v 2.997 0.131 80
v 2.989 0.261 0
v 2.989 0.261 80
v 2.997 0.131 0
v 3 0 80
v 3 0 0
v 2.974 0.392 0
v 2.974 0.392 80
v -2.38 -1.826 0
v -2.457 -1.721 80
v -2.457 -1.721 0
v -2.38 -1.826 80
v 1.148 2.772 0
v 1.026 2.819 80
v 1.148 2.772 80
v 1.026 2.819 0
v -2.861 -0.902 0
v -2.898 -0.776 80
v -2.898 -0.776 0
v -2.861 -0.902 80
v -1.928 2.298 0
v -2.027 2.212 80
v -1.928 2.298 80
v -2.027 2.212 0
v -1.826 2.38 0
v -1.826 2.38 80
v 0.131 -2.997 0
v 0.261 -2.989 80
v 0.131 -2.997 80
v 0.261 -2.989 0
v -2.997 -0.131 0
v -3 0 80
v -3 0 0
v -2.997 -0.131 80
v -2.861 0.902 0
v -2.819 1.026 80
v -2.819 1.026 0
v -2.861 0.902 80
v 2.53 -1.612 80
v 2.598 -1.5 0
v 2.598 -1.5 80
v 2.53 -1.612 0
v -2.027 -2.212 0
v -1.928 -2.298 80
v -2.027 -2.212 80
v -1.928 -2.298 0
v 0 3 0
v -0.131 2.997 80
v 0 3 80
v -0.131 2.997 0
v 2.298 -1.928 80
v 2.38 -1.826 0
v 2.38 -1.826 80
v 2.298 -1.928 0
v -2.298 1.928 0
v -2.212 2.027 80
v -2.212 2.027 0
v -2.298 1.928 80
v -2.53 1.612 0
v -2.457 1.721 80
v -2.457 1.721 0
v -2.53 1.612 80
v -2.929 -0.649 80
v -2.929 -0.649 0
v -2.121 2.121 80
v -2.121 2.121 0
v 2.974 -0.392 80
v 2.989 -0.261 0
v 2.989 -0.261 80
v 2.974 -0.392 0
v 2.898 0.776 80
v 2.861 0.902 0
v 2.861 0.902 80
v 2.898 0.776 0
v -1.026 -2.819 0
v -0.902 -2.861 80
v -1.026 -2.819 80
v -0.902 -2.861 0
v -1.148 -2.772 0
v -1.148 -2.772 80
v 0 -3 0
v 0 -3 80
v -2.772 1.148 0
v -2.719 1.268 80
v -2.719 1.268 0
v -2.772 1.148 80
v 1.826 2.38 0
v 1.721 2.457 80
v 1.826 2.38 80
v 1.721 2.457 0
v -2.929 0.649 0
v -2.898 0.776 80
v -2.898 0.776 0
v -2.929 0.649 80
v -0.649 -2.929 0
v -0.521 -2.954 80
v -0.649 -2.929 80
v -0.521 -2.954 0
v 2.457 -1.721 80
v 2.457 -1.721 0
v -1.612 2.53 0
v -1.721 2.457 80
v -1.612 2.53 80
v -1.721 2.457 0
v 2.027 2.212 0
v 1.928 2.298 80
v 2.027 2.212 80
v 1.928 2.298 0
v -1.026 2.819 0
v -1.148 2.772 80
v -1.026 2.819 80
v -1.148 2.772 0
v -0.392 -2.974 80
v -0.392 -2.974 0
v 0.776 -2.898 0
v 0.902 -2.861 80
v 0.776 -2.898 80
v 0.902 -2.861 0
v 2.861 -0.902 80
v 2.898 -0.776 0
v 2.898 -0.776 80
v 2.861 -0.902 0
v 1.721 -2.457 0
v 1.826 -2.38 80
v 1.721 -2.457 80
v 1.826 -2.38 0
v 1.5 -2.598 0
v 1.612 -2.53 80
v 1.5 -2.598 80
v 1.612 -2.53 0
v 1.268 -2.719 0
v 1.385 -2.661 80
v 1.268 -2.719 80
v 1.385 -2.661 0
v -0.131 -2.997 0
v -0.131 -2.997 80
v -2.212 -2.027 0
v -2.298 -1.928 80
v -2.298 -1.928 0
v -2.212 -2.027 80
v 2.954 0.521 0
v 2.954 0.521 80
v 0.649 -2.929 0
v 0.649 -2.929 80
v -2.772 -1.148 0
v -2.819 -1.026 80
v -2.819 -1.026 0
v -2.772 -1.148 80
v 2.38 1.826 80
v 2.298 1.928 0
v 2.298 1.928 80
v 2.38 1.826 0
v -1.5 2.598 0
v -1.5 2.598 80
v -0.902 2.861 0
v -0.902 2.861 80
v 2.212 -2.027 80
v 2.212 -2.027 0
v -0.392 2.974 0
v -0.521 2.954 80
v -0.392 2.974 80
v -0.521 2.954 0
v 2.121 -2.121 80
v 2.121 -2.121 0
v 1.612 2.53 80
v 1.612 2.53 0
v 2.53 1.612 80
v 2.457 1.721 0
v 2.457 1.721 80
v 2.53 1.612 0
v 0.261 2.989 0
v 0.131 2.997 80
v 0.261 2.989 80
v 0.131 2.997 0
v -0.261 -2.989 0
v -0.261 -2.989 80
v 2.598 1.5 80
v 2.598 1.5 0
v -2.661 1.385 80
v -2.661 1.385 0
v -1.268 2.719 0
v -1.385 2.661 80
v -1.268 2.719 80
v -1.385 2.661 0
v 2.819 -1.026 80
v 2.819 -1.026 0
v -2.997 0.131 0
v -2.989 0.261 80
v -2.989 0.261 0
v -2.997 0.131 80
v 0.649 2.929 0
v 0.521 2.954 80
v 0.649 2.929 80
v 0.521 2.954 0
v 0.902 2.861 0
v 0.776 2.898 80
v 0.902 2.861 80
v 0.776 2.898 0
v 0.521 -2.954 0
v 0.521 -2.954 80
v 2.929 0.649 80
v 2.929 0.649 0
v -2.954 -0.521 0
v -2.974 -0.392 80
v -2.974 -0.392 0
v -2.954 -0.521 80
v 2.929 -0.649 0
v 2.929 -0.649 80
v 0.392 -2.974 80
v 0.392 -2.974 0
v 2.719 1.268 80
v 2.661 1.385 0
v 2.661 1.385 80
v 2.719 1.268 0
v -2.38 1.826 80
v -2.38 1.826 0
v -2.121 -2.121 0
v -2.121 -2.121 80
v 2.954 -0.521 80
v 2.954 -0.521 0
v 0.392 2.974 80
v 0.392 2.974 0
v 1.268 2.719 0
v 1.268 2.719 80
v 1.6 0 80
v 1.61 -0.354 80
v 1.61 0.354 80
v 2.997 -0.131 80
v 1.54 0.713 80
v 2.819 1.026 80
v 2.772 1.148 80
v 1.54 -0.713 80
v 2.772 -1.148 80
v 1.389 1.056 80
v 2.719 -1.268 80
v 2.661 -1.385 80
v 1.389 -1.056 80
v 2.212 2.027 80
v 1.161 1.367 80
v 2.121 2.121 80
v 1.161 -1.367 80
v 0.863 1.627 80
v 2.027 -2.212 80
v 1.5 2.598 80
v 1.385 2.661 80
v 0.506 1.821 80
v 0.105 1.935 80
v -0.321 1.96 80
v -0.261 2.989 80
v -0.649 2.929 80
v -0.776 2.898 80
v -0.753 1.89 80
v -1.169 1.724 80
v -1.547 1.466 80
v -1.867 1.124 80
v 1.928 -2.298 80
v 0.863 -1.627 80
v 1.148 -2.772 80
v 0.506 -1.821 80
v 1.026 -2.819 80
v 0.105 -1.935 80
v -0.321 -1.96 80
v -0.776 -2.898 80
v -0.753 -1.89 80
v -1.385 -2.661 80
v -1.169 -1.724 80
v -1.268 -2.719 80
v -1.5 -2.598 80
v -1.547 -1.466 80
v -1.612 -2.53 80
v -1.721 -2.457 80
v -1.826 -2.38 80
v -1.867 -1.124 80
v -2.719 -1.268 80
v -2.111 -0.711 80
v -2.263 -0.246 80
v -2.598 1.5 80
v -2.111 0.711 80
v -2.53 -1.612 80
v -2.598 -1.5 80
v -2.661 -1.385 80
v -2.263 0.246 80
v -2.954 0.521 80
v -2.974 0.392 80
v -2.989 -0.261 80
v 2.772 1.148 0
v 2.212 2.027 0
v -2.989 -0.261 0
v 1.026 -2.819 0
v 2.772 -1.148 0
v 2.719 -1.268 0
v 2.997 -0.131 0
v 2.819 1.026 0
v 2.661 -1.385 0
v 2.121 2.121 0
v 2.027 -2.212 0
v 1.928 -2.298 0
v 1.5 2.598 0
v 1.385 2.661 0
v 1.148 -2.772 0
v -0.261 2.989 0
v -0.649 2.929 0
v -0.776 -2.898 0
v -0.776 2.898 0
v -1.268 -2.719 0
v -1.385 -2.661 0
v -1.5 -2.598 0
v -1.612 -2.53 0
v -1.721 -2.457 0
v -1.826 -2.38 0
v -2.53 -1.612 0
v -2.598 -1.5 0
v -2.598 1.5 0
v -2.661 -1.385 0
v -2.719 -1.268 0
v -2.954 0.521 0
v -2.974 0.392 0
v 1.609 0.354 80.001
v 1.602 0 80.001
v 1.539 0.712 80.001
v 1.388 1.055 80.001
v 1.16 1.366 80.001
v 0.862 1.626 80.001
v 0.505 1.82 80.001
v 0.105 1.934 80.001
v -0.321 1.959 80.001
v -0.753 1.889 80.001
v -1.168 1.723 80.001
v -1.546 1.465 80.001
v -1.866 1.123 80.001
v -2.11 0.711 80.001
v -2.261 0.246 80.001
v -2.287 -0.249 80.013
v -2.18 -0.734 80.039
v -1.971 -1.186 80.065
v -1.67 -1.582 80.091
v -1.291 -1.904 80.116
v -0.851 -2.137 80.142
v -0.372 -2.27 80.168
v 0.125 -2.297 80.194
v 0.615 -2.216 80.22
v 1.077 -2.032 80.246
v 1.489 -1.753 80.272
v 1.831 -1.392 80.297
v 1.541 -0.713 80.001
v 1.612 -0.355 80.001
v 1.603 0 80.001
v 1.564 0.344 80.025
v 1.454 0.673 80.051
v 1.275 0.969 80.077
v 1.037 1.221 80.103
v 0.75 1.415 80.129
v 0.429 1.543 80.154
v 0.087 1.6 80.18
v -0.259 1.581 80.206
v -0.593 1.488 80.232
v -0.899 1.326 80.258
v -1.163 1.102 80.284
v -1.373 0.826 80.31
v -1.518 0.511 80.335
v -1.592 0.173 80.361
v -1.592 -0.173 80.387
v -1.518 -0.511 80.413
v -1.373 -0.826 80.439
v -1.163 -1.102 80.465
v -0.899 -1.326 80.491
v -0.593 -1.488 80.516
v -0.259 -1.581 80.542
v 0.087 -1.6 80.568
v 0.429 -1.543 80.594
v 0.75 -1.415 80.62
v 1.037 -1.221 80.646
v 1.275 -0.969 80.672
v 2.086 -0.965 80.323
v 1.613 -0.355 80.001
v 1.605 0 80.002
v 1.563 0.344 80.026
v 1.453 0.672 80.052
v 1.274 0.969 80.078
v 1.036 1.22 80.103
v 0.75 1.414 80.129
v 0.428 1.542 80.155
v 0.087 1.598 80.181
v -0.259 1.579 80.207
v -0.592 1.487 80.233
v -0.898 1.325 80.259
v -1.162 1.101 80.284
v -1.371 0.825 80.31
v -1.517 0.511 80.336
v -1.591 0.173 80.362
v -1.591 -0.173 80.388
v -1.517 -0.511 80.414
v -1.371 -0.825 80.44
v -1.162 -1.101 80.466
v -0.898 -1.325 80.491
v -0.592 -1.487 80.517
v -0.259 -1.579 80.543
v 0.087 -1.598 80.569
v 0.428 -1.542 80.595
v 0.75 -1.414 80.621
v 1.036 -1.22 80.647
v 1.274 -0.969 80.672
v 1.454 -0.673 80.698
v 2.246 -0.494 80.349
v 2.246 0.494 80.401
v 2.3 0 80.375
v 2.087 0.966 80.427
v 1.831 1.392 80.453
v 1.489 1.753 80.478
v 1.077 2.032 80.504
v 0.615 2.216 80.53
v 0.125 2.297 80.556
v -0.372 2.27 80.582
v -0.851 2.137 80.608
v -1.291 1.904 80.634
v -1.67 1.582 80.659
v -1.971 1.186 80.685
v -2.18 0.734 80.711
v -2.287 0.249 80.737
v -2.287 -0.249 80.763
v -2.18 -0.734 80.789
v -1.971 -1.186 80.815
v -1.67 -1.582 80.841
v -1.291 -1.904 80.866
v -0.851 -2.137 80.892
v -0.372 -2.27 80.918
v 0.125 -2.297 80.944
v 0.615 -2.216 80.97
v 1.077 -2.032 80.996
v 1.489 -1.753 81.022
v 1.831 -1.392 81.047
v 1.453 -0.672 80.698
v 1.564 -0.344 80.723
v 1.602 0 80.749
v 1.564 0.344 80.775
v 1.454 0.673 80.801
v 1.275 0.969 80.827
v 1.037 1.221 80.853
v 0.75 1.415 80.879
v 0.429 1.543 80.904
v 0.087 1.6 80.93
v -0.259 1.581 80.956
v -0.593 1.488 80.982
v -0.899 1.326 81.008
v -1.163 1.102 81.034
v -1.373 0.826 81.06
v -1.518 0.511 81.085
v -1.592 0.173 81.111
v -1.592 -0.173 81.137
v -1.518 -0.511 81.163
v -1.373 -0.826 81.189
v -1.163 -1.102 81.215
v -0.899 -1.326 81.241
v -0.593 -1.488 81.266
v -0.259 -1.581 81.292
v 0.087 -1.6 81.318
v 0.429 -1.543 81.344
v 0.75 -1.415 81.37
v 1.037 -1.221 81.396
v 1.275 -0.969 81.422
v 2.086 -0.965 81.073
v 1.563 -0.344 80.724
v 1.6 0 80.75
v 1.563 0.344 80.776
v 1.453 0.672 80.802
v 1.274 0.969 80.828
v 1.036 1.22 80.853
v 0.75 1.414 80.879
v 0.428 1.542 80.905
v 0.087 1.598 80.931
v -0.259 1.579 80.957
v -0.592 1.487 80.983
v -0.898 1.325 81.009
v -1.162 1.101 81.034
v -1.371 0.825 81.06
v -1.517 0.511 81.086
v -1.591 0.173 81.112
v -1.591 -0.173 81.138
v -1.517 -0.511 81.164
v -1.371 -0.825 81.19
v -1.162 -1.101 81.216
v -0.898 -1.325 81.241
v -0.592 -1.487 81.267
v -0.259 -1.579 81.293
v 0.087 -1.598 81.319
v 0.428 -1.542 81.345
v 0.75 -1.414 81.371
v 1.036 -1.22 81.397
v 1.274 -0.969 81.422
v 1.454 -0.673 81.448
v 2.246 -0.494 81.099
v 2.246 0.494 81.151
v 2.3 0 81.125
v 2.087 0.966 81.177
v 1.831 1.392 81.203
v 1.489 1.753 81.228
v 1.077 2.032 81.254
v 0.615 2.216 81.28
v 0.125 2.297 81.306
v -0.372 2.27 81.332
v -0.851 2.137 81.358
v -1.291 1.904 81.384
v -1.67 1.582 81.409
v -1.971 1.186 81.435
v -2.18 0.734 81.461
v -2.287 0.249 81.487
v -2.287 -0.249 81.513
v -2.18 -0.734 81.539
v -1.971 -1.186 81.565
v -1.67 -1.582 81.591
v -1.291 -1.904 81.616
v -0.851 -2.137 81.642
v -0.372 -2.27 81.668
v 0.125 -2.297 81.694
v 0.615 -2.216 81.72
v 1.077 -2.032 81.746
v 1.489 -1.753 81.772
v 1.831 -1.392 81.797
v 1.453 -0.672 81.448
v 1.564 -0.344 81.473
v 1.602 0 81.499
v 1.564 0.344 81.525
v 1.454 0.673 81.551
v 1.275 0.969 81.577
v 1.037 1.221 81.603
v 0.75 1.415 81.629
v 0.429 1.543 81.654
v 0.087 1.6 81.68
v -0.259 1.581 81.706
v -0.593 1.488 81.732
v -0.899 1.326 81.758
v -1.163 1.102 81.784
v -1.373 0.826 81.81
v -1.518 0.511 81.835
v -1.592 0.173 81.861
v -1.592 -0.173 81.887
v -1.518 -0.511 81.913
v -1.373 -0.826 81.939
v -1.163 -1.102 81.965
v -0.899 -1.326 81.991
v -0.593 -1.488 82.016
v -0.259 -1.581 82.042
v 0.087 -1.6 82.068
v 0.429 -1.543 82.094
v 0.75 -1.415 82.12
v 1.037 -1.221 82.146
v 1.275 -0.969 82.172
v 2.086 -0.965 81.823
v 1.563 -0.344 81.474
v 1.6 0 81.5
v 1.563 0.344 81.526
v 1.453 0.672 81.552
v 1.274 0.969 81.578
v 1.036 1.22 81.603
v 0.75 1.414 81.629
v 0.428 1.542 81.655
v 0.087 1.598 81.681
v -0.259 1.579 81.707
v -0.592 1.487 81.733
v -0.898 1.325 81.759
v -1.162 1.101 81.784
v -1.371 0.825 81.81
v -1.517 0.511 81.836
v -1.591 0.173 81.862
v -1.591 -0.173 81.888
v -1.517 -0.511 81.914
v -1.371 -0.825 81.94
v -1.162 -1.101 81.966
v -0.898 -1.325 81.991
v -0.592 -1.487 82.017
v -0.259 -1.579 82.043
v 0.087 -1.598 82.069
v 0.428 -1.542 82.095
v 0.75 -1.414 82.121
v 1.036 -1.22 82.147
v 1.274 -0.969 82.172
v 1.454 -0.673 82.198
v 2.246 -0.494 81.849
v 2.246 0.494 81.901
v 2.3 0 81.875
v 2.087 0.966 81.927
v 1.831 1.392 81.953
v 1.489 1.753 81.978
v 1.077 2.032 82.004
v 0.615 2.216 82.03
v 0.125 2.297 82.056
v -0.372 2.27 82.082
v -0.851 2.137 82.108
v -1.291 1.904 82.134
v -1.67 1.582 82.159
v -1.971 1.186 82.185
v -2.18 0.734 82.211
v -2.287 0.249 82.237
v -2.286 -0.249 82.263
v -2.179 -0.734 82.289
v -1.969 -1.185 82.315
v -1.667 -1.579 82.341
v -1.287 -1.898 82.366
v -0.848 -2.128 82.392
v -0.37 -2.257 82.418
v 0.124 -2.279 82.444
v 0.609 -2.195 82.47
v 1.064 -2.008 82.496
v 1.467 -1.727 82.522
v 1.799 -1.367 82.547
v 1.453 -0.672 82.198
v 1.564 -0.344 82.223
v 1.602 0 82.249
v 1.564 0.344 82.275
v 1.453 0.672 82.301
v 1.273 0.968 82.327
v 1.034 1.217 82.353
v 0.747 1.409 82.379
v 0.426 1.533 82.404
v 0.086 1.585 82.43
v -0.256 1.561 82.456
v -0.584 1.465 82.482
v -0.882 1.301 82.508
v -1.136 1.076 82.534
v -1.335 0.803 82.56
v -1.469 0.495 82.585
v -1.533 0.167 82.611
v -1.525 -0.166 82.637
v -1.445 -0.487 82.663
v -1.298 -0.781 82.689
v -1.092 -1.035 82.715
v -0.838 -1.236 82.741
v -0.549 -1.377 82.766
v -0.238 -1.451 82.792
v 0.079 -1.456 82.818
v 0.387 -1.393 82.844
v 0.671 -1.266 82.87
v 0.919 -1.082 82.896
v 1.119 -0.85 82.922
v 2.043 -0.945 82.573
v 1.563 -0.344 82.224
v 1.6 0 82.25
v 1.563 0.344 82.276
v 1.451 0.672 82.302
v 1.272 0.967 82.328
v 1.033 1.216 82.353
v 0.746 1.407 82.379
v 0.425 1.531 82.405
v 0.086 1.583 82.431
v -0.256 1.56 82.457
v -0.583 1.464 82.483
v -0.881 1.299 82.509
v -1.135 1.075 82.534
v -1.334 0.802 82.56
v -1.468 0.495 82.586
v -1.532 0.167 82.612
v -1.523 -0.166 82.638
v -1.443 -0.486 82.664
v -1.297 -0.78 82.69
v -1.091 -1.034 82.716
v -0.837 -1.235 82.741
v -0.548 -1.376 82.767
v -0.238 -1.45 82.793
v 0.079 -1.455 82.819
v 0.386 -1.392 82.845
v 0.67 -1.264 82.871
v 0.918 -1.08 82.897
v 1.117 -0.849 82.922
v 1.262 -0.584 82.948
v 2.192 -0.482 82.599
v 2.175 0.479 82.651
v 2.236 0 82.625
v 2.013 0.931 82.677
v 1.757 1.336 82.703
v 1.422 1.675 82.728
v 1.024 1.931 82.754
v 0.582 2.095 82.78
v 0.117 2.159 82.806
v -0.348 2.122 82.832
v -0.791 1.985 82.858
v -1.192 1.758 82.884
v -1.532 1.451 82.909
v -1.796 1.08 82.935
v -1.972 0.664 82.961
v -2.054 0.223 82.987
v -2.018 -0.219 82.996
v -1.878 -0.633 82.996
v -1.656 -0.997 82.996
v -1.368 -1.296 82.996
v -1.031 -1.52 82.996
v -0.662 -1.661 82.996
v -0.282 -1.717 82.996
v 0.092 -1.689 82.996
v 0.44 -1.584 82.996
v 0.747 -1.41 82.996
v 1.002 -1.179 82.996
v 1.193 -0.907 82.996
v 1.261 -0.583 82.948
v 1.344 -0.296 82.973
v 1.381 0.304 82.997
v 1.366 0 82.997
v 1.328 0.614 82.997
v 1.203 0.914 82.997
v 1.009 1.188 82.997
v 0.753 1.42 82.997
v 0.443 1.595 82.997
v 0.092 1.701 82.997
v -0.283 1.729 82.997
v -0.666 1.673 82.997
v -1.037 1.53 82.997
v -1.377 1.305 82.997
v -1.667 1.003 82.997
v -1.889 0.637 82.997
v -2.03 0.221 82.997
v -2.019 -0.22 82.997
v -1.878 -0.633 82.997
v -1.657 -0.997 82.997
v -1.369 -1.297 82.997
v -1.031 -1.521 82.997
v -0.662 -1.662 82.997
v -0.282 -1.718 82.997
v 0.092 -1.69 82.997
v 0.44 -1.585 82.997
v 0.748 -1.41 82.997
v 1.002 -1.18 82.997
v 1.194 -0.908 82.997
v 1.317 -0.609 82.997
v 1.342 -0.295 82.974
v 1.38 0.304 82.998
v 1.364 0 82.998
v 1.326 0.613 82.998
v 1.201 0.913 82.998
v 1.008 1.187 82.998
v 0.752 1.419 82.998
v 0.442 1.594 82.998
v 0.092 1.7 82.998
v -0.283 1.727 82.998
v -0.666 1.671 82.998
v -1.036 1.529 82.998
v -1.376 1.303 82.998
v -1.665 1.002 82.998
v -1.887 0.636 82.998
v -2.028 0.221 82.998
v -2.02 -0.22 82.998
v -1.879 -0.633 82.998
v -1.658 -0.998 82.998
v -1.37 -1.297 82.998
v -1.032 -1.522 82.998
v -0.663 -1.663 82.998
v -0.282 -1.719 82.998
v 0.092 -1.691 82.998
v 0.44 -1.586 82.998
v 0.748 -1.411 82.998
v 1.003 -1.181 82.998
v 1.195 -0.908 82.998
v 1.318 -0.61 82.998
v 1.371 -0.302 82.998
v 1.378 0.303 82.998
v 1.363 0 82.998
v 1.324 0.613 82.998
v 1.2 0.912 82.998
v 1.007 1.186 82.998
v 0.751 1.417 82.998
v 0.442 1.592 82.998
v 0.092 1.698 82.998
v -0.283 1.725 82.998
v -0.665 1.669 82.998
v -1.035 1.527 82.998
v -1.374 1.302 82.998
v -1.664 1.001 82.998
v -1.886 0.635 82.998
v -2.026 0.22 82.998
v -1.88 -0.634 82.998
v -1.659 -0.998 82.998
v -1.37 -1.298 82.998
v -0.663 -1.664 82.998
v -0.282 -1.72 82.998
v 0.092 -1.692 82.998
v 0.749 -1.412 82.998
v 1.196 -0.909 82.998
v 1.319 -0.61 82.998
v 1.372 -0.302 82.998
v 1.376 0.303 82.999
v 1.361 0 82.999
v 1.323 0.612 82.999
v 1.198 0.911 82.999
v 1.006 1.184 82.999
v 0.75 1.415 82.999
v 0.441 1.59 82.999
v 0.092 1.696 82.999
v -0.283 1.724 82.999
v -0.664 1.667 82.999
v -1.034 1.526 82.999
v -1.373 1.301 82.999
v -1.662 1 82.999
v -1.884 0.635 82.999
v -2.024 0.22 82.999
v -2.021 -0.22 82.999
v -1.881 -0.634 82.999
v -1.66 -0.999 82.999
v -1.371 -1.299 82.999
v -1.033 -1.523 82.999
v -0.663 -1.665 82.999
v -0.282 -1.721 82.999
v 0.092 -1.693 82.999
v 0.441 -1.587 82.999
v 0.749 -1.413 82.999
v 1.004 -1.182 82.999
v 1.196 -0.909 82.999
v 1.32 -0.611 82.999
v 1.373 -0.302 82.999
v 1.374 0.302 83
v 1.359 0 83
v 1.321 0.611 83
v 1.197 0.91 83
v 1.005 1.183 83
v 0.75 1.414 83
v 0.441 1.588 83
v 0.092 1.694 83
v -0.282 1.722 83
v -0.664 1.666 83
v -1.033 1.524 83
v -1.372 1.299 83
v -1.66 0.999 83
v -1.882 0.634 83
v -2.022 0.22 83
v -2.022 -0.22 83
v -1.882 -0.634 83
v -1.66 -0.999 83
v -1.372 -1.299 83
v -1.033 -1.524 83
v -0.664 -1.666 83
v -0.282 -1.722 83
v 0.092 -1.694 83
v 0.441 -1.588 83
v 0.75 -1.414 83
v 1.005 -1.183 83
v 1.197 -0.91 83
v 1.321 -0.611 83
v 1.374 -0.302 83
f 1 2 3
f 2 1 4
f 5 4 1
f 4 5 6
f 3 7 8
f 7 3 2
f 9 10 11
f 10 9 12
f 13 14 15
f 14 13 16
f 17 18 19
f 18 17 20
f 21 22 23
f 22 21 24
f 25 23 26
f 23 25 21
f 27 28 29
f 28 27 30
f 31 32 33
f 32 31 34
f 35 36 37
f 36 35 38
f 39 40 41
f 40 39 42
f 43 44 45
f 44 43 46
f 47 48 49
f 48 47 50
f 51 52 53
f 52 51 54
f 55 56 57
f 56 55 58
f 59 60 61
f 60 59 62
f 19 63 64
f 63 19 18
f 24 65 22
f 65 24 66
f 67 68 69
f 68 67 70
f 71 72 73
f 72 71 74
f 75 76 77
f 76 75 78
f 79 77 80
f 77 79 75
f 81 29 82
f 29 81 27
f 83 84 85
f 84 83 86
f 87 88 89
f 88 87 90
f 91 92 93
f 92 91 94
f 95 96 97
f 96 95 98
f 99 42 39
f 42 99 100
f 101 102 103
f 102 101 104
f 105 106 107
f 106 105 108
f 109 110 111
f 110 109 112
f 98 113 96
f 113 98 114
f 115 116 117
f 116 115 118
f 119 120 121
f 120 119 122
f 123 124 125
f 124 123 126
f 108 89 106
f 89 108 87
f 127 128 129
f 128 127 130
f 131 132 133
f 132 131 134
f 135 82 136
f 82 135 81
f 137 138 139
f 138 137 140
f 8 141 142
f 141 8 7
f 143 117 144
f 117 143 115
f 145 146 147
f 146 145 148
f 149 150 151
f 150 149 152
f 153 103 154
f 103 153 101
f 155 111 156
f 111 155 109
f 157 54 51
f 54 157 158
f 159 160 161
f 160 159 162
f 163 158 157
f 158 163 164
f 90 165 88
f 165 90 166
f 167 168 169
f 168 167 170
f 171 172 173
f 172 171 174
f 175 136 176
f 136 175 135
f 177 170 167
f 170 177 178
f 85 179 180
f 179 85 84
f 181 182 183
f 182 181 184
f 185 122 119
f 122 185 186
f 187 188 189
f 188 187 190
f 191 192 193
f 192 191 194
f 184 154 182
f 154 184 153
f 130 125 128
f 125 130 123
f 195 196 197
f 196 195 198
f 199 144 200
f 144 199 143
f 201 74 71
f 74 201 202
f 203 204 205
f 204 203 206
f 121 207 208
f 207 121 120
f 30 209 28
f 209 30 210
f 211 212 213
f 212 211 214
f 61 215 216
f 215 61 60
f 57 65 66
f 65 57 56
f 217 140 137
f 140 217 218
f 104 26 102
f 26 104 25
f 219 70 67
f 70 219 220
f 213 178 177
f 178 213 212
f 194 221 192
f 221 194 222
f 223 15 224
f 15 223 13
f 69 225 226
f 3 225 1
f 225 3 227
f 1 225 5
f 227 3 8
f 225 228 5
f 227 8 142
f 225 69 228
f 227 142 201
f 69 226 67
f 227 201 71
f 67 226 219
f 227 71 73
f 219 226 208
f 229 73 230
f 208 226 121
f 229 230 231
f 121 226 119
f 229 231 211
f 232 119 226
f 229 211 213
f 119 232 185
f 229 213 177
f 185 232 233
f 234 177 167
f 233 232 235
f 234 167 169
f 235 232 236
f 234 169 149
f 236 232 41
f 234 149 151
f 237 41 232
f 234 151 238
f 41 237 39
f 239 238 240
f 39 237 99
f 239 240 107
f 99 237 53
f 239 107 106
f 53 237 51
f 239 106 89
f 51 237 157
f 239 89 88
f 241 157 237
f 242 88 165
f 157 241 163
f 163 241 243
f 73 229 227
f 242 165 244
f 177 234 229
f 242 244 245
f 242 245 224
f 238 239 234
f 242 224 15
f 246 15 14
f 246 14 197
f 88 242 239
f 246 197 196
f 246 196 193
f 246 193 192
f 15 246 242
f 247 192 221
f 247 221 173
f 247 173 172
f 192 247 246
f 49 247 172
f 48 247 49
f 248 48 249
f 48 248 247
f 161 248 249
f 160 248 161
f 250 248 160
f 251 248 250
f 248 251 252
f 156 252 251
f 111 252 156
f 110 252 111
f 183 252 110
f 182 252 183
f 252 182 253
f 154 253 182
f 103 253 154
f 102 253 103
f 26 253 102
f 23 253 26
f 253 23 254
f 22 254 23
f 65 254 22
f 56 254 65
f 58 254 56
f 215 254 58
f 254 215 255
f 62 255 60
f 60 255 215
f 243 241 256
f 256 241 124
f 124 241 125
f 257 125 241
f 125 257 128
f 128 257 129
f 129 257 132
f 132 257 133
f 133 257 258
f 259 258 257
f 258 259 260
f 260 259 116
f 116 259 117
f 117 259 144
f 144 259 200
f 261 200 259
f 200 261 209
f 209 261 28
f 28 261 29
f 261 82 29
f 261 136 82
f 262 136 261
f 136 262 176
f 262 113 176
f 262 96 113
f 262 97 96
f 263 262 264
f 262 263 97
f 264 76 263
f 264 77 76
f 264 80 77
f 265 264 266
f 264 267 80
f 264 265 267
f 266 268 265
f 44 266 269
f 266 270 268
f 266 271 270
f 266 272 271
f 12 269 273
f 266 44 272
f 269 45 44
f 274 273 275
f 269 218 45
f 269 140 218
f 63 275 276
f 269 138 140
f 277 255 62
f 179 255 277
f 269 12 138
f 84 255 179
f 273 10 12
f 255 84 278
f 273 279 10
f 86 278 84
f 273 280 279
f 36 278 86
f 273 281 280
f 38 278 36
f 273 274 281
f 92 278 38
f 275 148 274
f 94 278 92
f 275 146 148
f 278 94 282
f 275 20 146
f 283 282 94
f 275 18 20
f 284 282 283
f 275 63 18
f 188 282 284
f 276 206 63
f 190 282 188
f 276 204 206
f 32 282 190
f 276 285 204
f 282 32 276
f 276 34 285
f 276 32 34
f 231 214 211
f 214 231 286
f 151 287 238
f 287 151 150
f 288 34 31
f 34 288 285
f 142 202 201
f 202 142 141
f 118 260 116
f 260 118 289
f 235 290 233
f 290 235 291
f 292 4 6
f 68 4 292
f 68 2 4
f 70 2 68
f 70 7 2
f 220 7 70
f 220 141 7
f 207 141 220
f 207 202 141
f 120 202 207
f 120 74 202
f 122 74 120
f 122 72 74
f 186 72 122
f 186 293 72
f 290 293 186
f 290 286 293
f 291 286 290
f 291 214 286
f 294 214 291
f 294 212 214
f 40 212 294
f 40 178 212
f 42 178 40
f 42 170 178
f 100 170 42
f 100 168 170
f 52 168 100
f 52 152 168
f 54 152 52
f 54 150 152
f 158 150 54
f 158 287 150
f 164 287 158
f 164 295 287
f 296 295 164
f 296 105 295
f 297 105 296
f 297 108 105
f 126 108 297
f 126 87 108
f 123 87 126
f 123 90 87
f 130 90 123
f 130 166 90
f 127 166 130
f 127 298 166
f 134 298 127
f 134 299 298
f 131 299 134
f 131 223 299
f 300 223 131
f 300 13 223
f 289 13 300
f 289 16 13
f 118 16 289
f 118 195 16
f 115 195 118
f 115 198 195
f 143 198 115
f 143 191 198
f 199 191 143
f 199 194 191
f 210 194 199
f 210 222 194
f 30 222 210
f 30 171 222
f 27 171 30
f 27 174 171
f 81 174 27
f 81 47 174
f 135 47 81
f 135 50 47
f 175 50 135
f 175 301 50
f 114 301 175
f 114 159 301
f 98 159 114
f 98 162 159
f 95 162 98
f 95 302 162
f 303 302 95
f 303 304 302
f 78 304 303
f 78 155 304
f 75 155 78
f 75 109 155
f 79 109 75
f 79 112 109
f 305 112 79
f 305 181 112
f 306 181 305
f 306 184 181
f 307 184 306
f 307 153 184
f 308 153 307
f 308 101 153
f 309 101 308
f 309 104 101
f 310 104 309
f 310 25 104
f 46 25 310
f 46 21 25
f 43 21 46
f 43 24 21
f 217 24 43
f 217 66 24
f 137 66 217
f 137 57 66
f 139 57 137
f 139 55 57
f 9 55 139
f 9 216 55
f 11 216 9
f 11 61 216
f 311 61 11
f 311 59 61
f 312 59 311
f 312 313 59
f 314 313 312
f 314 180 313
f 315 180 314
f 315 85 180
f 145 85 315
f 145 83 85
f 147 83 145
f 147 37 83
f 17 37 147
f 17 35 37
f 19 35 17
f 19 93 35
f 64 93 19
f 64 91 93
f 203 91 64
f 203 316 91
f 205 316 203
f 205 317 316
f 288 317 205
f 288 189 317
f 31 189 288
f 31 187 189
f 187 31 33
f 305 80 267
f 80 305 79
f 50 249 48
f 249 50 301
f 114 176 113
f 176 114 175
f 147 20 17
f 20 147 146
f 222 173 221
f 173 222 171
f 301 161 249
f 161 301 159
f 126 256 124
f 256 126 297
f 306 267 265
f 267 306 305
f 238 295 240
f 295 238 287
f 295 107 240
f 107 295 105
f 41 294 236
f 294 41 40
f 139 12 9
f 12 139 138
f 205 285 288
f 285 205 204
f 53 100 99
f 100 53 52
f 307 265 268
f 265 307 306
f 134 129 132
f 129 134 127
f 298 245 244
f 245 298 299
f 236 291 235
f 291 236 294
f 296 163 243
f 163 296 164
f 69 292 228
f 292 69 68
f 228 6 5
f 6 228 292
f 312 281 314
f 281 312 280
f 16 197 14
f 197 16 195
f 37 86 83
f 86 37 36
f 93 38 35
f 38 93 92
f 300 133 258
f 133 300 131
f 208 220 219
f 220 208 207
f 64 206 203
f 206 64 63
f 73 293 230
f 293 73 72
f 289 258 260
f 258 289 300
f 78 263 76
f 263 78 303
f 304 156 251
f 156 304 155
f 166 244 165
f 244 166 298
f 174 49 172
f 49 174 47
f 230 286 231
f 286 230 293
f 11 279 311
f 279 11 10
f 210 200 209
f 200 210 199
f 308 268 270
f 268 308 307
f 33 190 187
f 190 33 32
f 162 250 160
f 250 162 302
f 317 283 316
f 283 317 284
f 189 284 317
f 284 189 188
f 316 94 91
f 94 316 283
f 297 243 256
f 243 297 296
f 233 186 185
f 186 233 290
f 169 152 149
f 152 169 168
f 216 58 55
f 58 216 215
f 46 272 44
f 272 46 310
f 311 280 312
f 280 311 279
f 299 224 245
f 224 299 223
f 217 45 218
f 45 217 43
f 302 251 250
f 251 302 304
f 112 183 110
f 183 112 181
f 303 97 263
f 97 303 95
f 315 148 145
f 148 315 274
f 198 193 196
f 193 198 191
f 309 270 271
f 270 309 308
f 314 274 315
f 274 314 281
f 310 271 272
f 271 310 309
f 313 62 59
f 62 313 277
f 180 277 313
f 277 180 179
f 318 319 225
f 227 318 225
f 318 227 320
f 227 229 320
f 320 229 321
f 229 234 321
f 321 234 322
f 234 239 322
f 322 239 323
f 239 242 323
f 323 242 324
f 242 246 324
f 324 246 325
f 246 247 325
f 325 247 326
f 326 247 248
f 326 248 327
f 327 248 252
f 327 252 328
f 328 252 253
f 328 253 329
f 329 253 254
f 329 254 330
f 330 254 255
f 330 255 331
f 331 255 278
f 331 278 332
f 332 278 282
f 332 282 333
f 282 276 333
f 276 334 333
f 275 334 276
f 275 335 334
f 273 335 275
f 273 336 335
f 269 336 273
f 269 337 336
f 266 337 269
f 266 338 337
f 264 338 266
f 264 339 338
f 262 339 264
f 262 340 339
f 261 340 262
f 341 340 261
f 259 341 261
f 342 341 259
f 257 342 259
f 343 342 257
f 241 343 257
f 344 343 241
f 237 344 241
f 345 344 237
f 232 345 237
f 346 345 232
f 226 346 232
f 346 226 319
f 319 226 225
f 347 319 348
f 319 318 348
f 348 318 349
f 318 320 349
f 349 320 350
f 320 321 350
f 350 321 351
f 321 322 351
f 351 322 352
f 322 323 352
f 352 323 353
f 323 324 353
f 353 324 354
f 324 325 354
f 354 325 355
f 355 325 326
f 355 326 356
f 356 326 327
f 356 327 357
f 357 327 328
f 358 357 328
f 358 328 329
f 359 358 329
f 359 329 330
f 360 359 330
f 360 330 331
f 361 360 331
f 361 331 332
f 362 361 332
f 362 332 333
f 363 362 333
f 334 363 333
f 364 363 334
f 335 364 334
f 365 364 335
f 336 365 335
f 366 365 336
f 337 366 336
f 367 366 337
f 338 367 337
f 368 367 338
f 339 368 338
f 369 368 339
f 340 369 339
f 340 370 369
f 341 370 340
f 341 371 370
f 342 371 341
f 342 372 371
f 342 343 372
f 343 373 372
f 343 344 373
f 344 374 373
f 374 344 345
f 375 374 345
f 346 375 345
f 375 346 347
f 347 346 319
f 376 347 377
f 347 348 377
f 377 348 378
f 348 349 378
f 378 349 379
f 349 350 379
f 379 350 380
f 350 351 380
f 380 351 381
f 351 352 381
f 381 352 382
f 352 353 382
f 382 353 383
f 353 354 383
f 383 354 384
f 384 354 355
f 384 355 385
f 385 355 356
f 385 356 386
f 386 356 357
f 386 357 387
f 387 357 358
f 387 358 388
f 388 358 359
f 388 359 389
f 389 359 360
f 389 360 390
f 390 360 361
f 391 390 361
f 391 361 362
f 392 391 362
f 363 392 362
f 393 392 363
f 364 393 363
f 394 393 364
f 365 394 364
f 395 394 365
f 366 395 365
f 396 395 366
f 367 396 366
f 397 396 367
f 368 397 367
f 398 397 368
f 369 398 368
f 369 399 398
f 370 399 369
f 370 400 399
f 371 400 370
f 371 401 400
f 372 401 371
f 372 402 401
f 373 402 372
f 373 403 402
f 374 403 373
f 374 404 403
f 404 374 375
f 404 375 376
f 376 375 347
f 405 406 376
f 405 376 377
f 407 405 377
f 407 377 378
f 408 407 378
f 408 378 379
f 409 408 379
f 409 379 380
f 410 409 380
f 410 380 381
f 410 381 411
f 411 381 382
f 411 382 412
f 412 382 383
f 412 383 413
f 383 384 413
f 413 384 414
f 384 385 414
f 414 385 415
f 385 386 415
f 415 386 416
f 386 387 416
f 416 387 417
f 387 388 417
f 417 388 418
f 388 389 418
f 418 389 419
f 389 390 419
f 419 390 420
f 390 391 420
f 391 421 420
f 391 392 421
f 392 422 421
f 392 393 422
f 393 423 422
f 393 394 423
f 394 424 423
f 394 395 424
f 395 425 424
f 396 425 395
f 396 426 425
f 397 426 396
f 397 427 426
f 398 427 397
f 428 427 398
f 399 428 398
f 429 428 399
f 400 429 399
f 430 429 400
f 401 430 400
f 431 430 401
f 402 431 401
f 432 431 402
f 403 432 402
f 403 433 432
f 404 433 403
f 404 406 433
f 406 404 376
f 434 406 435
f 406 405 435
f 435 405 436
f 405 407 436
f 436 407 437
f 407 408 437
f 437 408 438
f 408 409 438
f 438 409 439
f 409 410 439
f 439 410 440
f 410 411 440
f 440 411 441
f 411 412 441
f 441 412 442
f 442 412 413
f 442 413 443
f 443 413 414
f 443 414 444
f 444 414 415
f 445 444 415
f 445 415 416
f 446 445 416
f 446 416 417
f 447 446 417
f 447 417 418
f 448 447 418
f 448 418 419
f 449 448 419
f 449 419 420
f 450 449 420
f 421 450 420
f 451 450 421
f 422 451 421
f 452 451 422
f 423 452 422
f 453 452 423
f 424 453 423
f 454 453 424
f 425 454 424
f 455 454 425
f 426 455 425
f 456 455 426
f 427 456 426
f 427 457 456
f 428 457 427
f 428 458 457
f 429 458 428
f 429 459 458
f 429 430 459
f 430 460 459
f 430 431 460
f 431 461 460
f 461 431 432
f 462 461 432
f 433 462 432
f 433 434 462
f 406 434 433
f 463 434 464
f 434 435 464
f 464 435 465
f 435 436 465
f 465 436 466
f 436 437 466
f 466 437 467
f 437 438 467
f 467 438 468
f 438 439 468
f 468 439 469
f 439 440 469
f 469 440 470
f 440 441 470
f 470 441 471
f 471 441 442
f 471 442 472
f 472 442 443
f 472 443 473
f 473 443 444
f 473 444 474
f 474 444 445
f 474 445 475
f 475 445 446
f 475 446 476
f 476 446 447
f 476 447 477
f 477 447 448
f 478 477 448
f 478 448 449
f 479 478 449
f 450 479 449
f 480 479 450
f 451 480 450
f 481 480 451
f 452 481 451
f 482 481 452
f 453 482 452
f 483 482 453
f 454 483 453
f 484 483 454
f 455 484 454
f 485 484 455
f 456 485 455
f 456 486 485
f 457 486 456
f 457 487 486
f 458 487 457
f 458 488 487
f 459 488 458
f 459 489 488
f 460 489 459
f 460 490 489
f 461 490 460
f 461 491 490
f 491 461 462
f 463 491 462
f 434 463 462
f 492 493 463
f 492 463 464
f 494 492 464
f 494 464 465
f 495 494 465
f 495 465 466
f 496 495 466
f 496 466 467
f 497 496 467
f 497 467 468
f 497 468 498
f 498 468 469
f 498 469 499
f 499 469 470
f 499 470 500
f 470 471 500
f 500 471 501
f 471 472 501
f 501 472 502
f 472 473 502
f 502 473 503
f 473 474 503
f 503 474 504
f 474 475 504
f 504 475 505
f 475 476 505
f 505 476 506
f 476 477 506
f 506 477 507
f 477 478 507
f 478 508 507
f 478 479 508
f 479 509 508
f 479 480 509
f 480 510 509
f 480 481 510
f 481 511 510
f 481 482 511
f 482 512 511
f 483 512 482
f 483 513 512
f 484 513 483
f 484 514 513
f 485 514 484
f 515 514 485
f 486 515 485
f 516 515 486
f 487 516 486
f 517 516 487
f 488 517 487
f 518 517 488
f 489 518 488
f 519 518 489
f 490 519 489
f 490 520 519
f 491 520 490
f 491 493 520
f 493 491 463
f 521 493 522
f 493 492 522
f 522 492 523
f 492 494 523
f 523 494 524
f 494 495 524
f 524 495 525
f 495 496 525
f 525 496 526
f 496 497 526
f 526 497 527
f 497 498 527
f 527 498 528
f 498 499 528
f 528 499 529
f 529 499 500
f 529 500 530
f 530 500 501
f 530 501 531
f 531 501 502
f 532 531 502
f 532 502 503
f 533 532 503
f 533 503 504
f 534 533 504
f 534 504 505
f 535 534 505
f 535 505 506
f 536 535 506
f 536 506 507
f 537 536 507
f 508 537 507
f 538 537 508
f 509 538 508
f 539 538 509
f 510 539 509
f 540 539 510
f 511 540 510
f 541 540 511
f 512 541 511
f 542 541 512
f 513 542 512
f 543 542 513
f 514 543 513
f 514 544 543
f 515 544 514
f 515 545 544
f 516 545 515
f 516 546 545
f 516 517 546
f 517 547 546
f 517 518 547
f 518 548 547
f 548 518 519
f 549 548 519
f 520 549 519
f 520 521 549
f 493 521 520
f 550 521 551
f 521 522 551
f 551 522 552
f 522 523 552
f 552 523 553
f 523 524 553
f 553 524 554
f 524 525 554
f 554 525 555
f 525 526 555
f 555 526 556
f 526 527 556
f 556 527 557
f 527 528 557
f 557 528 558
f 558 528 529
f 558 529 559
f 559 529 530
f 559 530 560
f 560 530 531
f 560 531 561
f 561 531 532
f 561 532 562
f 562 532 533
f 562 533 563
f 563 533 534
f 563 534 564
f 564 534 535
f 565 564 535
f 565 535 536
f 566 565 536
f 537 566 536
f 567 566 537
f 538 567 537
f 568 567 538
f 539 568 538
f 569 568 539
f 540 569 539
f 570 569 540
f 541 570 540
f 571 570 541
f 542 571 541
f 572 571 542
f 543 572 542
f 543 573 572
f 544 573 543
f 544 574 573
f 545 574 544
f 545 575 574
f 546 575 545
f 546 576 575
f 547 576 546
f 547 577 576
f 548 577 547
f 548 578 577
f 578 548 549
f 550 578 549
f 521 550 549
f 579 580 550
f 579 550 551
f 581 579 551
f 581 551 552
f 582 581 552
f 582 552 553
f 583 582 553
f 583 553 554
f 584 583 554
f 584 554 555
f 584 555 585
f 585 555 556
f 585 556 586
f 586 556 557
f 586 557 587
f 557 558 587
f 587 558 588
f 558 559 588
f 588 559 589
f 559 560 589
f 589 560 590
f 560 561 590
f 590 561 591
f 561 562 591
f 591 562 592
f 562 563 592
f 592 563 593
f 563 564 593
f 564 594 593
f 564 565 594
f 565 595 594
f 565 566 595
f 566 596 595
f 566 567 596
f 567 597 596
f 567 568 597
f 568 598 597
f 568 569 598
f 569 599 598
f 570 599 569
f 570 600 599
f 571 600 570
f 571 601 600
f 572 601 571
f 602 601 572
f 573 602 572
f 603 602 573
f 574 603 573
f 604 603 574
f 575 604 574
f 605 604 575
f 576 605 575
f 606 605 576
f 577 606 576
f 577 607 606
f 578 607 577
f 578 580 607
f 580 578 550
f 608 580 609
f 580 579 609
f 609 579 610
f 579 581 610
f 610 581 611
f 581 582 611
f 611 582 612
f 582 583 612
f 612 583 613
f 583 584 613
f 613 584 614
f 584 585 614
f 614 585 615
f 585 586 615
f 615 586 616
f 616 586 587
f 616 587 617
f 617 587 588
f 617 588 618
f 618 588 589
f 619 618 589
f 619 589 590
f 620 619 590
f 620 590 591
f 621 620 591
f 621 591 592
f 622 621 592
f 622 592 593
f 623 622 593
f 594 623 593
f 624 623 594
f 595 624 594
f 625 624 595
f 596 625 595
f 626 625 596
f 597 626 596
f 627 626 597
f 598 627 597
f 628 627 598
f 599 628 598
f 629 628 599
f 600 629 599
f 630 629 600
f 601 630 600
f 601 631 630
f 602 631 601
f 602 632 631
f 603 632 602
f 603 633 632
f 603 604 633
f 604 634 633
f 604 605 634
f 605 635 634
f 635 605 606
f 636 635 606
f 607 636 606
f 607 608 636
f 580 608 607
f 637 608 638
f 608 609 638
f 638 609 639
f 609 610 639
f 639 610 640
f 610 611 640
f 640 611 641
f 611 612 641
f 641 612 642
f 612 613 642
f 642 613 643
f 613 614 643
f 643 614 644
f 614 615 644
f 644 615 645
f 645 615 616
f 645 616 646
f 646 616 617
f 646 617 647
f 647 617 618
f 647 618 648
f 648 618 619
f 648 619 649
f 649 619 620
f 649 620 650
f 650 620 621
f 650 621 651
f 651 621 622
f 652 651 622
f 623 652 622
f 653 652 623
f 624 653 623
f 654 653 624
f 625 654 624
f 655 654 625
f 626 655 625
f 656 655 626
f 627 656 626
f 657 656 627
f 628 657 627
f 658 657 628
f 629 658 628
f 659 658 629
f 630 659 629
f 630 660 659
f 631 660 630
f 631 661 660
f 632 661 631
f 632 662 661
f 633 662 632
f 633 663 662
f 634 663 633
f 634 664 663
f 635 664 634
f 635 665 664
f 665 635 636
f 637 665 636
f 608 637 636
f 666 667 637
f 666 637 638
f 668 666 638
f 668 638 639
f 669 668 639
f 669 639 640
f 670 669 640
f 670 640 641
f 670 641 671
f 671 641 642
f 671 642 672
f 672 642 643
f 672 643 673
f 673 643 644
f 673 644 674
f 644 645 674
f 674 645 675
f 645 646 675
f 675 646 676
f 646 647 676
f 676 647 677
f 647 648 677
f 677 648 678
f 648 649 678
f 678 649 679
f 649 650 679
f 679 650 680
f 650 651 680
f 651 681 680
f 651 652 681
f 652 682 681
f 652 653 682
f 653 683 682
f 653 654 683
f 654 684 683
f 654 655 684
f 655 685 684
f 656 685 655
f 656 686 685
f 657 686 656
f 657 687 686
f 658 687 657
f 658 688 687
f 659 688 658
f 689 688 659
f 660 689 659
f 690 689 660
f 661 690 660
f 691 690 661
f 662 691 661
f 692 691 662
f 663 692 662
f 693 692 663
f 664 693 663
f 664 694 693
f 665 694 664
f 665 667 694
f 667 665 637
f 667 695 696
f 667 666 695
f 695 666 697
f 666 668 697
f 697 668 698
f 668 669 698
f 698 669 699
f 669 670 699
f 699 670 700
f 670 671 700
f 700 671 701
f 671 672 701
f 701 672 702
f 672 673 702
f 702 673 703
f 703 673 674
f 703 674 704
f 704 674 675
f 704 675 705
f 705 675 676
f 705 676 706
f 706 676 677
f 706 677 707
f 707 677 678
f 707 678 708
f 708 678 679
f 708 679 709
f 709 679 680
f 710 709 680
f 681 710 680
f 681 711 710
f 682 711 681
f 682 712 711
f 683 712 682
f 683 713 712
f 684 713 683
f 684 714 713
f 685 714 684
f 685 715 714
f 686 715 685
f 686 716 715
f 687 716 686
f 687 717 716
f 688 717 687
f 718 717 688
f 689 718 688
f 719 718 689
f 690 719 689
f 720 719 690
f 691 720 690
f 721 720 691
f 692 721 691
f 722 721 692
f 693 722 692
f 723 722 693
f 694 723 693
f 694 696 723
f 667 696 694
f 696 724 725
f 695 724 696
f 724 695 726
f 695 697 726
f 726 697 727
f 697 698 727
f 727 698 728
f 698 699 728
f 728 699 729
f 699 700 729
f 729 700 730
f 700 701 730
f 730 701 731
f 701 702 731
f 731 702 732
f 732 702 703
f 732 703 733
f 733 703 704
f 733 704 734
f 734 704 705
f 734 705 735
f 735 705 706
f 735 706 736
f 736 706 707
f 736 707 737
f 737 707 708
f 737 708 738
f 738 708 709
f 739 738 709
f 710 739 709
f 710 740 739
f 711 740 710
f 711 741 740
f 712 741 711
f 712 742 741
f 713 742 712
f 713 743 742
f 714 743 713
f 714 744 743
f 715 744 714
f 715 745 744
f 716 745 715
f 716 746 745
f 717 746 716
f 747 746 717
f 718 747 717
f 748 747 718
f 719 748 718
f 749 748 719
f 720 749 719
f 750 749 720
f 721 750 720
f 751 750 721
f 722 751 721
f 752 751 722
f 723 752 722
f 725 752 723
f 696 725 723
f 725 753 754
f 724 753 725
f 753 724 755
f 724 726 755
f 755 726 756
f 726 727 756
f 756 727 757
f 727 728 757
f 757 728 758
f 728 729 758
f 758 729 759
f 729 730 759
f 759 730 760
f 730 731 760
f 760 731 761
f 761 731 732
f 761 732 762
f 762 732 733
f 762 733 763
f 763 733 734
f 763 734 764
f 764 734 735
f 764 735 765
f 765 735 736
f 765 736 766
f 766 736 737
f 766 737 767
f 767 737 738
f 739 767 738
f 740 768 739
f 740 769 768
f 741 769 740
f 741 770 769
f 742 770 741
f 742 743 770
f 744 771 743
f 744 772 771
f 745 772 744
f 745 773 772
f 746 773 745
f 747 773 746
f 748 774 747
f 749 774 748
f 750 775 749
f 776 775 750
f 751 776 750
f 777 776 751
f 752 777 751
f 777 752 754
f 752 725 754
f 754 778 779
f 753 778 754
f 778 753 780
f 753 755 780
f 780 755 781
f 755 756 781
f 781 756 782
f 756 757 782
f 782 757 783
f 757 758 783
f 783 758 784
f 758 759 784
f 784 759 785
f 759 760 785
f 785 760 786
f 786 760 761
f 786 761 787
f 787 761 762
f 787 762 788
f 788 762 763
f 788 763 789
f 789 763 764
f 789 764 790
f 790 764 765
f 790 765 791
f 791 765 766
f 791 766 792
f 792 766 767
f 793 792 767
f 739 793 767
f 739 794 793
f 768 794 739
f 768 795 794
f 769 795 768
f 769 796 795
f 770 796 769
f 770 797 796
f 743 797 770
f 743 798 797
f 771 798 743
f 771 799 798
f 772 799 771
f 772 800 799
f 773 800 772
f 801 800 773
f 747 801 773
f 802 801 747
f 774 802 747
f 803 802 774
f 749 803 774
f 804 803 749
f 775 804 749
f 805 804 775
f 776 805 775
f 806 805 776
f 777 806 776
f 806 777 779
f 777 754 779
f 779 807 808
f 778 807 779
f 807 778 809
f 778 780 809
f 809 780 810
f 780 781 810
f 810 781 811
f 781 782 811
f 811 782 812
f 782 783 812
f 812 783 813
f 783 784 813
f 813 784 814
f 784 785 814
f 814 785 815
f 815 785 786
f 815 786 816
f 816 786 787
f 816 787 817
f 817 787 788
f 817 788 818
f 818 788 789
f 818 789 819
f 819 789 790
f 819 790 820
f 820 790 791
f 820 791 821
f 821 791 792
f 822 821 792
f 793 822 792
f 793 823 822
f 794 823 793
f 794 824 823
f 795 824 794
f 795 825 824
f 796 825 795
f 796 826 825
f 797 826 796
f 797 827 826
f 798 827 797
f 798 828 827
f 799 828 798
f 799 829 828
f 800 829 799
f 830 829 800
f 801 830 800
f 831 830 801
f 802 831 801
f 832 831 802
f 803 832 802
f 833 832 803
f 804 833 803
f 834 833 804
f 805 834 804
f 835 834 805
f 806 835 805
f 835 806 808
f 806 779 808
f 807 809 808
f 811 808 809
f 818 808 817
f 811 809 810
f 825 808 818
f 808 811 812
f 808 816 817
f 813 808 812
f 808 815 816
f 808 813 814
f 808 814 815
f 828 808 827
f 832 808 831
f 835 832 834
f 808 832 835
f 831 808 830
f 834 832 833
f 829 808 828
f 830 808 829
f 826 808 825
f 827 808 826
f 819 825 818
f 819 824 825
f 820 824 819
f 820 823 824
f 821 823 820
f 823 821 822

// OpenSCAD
// Created 2016-2017 by Ryan A. Colyer.
// This work is released with CC0 into the public domain.
// https://creativecommons.org/publicdomain/zero/1.0/
//
// https://www.thingiverse.com/thing:1686322
//
// v2.1

$fn = 100;

screw_resolution = 0.5;  // in mm

// Legs
leg_diameter = 6;
leg_height = 80;

// Provides standard metric thread pitches.
function ThreadPitch(diameter) =
  (diameter <= 64) ?
    lookup(diameter, [
      [2, 0.4],
      [2.5, 0.45],
      [3, 0.5],
      [4, 0.7],
      [5, 0.8],
      [6, 1.0],
      [7, 1.0],
      [8, 1.25],
      [10, 1.5],
      [12, 1.75],
      [14, 2.0],
      [16, 2.0],
      [18, 2.5],
      [20, 2.5],
      [22, 2.5],
      [24, 3.0],
      [27, 3.0],
      [30, 3.5],
      [33, 3.5],
      [36, 4.0],
      [39, 4.0],
      [42, 4.5],
      [48, 5.0],
      [52, 5.0],
      [56, 5.5],
      [60, 5.5],
      [64, 6.0]
    ]) :
    diameter * 6.0 / 64;


// This generates a closed polyhedron from an array of arrays of points,
// with each inner array tracing out one loop outlining the polyhedron.
// pointarrays should contain an array of N arrays each of size P outlining a
// closed manifold.  The points must obey the right-hand rule.  For example,
// looking down, the P points in the inner arrays are counter-clockwise in a
// loop, while the N point arrays increase in height.  Points in each inner
// array do not need to be equal height, but they usually should not meet or
// cross the line segments from the adjacent points in the other arrays.
// (N>=2, P>=3)
// Core triangles:
//   [j][i], [j+1][i], [j+1][(i+1)%P]
//   [j][i], [j+1][(i+1)%P], [j][(i+1)%P]
//   Then triangles are formed in a loop with the middle point of the first
//   and last array.
module ClosePoints(pointarrays) {
  function recurse_avg(arr, n=0, p=[0,0,0]) = (n>=len(arr)) ? p :
    recurse_avg(arr, n+1, p+(arr[n]-p)/(n+1));

  N = len(pointarrays);
  P = len(pointarrays[0]);
  NP = N*P;
  lastarr = pointarrays[N-1];
  midbot = recurse_avg(pointarrays[0]);
  midtop = recurse_avg(pointarrays[N-1]);

  faces_bot = [
    for (i=[0:P-1])
      [0,i+1,1+(i+1)%len(pointarrays[0])]
  ];

  loop_offset = 1;
  bot_len = loop_offset + P;

  faces_loop = [
    for (j=[0:N-2], i=[0:P-1], t=[0:1])
      [loop_offset, loop_offset, loop_offset] + (t==0 ?
      [j*P+i, (j+1)*P+i, (j+1)*P+(i+1)%P] :
      [j*P+i, (j+1)*P+(i+1)%P, j*P+(i+1)%P])
  ];

  top_offset = loop_offset + NP - P;
  midtop_offset = top_offset + P;

  faces_top = [
    for (i=[0:P-1])
      [midtop_offset,top_offset+(i+1)%P,top_offset+i]
  ];

  points = [
    for (i=[-1:NP])
      (i<0) ? midbot :
      ((i==NP) ? midtop :
      pointarrays[floor(i/P)][i%P])
  ];
  faces = concat(faces_bot, faces_loop, faces_top);

  polyhedron(points=points, faces=faces);
}

// This creates a vertical rod at the origin with external threads.  It uses
// metric standards by default.
module ScrewThread(outer_diam, height, pitch=0, tooth_angle=30, tolerance=0.4, tip_height=0, tooth_height=0, tip_min_fract=0) {

  pitch = (pitch==0) ? ThreadPitch(outer_diam) : pitch;
  tooth_height = (tooth_height==0) ? pitch : tooth_height;
  tip_min_fract = (tip_min_fract<0) ? 0 :
    ((tip_min_fract>0.9999) ? 0.9999 : tip_min_fract);

  outer_diam_cor = outer_diam + 0.25*tolerance; // Plastic shrinkage correction
  inner_diam = outer_diam - tooth_height/tan(tooth_angle);
  or = (outer_diam_cor < screw_resolution) ?
    screw_resolution/2 : outer_diam_cor / 2;
  ir = (inner_diam < screw_resolution) ? screw_resolution/2 : inner_diam / 2;
  height = (height < screw_resolution) ? screw_resolution : height;

  steps_per_loop_try = ceil(2*3.14159265359*or / screw_resolution);
  steps_per_loop = (steps_per_loop_try < 4) ? 4 : steps_per_loop_try;
  hs_ext = 3;
  hsteps = ceil(3 * height / pitch) + 2*hs_ext;

  extent = or - ir;

  tip_start = height-tip_height;
  tip_height_sc = tip_height / (1-tip_min_fract);

  tip_height_ir = (tip_height_sc > tooth_height/2) ?
    tip_height_sc - tooth_height/2 : tip_height_sc;

  tip_height_w = (tip_height_sc > tooth_height) ? tooth_height : tip_height_sc;
  tip_wstart = height + tip_height_sc - tip_height - tip_height_w;


  function tooth_width(a, h, pitch, tooth_height, extent) =
    let(
      ang_full = h*360.0/pitch-a,
      ang_pn = atan2(sin(ang_full), cos(ang_full)),
      ang = ang_pn < 0 ? ang_pn+360 : ang_pn,
      frac = ang/360,
      tfrac_half = tooth_height / (2*pitch),
      tfrac_cut = 2*tfrac_half
    )
    (frac > tfrac_cut) ? 0 : (
      (frac <= tfrac_half) ?
        ((frac / tfrac_half) * extent) :
        ((1 - (frac - tfrac_half)/tfrac_half) * extent)
    );


  pointarrays = [
    for (hs=[0:hsteps])
      [
        for (s=[0:steps_per_loop-1])
          let(
            ang_full = s*360.0/steps_per_loop,
            ang_pn = atan2(sin(ang_full), cos(ang_full)),
            ang = ang_pn < 0 ? ang_pn+360 : ang_pn,

            h_fudge = pitch*0.001,

            h_mod =
              (hs%3 == 2) ?
                ((s == steps_per_loop-1) ? tooth_height - h_fudge : (
                 (s == steps_per_loop-2) ? tooth_height/2 : 0)) : (
              (hs%3 == 0) ?
                ((s == steps_per_loop-1) ? pitch-tooth_height/2 : (
                 (s == steps_per_loop-2) ? pitch-tooth_height + h_fudge : 0)) :
                ((s == steps_per_loop-1) ? pitch-tooth_height/2 + h_fudge : (
                 (s == steps_per_loop-2) ? tooth_height/2 : 0))
              ),

            h_level =
              (hs%3 == 2) ? tooth_height - h_fudge : (
              (hs%3 == 0) ? 0 : tooth_height/2),

            h_ub = floor((hs-hs_ext)/3) * pitch
              + h_level + ang*pitch/360.0 - h_mod,
            h_max = height - (hsteps-hs) * h_fudge,
            h_min = hs * h_fudge,
            h = (h_ub < h_min) ? h_min : ((h_ub > h_max) ? h_max : h_ub),

            ht = h - tip_start,
            hf_ir = ht/tip_height_ir,
            ht_w = h - tip_wstart,
            hf_w_t = ht_w/tip_height_w,
            hf_w = (hf_w_t < 0) ? 0 : ((hf_w_t > 1) ? 1 : hf_w_t),

            ext_tip = (h <= tip_wstart) ? extent : (1-hf_w) * extent,
            wnormal = tooth_width(ang, h, pitch, tooth_height, ext_tip),
            w = (h <= tip_wstart) ? wnormal :
              (1-hf_w) * wnormal +
              hf_w * (0.1*screw_resolution + (wnormal * wnormal * wnormal /
                (ext_tip*ext_tip+0.1*screw_resolution))),
            r = (ht <= 0) ? ir + w :
              ( (ht < tip_height_ir ? ((2/(1+(hf_ir*hf_ir))-1) * ir) : 0) + w)
          )
          [r*cos(ang), r*sin(ang), h]
      ]
  ];


  ClosePoints(pointarrays);
}

// Solid rod on the bottom, external threads on the top.
module RodStart(height, diameter, thread_len=0, thread_diam=0, thread_pitch=0) {
  // A reasonable default.
  thread_diam = (thread_diam==0) ? 0.75*diameter : thread_diam;
  thread_len = (thread_len==0) ? 0.5*diameter : thread_len;
  thread_pitch = (thread_pitch==0) ? ThreadPitch(thread_diam) : thread_pitch;

  cylinder(r=diameter/2, h=height, $fn=24*diameter);

  translate([0, 0, height])
    ScrewThread(thread_diam, thread_len, thread_pitch,
      tip_height=thread_pitch, tip_min_fract=0.75);
}

// Legs
module leg() {
  RodStart(leg_height, leg_diameter);
}

// Render
leg();
